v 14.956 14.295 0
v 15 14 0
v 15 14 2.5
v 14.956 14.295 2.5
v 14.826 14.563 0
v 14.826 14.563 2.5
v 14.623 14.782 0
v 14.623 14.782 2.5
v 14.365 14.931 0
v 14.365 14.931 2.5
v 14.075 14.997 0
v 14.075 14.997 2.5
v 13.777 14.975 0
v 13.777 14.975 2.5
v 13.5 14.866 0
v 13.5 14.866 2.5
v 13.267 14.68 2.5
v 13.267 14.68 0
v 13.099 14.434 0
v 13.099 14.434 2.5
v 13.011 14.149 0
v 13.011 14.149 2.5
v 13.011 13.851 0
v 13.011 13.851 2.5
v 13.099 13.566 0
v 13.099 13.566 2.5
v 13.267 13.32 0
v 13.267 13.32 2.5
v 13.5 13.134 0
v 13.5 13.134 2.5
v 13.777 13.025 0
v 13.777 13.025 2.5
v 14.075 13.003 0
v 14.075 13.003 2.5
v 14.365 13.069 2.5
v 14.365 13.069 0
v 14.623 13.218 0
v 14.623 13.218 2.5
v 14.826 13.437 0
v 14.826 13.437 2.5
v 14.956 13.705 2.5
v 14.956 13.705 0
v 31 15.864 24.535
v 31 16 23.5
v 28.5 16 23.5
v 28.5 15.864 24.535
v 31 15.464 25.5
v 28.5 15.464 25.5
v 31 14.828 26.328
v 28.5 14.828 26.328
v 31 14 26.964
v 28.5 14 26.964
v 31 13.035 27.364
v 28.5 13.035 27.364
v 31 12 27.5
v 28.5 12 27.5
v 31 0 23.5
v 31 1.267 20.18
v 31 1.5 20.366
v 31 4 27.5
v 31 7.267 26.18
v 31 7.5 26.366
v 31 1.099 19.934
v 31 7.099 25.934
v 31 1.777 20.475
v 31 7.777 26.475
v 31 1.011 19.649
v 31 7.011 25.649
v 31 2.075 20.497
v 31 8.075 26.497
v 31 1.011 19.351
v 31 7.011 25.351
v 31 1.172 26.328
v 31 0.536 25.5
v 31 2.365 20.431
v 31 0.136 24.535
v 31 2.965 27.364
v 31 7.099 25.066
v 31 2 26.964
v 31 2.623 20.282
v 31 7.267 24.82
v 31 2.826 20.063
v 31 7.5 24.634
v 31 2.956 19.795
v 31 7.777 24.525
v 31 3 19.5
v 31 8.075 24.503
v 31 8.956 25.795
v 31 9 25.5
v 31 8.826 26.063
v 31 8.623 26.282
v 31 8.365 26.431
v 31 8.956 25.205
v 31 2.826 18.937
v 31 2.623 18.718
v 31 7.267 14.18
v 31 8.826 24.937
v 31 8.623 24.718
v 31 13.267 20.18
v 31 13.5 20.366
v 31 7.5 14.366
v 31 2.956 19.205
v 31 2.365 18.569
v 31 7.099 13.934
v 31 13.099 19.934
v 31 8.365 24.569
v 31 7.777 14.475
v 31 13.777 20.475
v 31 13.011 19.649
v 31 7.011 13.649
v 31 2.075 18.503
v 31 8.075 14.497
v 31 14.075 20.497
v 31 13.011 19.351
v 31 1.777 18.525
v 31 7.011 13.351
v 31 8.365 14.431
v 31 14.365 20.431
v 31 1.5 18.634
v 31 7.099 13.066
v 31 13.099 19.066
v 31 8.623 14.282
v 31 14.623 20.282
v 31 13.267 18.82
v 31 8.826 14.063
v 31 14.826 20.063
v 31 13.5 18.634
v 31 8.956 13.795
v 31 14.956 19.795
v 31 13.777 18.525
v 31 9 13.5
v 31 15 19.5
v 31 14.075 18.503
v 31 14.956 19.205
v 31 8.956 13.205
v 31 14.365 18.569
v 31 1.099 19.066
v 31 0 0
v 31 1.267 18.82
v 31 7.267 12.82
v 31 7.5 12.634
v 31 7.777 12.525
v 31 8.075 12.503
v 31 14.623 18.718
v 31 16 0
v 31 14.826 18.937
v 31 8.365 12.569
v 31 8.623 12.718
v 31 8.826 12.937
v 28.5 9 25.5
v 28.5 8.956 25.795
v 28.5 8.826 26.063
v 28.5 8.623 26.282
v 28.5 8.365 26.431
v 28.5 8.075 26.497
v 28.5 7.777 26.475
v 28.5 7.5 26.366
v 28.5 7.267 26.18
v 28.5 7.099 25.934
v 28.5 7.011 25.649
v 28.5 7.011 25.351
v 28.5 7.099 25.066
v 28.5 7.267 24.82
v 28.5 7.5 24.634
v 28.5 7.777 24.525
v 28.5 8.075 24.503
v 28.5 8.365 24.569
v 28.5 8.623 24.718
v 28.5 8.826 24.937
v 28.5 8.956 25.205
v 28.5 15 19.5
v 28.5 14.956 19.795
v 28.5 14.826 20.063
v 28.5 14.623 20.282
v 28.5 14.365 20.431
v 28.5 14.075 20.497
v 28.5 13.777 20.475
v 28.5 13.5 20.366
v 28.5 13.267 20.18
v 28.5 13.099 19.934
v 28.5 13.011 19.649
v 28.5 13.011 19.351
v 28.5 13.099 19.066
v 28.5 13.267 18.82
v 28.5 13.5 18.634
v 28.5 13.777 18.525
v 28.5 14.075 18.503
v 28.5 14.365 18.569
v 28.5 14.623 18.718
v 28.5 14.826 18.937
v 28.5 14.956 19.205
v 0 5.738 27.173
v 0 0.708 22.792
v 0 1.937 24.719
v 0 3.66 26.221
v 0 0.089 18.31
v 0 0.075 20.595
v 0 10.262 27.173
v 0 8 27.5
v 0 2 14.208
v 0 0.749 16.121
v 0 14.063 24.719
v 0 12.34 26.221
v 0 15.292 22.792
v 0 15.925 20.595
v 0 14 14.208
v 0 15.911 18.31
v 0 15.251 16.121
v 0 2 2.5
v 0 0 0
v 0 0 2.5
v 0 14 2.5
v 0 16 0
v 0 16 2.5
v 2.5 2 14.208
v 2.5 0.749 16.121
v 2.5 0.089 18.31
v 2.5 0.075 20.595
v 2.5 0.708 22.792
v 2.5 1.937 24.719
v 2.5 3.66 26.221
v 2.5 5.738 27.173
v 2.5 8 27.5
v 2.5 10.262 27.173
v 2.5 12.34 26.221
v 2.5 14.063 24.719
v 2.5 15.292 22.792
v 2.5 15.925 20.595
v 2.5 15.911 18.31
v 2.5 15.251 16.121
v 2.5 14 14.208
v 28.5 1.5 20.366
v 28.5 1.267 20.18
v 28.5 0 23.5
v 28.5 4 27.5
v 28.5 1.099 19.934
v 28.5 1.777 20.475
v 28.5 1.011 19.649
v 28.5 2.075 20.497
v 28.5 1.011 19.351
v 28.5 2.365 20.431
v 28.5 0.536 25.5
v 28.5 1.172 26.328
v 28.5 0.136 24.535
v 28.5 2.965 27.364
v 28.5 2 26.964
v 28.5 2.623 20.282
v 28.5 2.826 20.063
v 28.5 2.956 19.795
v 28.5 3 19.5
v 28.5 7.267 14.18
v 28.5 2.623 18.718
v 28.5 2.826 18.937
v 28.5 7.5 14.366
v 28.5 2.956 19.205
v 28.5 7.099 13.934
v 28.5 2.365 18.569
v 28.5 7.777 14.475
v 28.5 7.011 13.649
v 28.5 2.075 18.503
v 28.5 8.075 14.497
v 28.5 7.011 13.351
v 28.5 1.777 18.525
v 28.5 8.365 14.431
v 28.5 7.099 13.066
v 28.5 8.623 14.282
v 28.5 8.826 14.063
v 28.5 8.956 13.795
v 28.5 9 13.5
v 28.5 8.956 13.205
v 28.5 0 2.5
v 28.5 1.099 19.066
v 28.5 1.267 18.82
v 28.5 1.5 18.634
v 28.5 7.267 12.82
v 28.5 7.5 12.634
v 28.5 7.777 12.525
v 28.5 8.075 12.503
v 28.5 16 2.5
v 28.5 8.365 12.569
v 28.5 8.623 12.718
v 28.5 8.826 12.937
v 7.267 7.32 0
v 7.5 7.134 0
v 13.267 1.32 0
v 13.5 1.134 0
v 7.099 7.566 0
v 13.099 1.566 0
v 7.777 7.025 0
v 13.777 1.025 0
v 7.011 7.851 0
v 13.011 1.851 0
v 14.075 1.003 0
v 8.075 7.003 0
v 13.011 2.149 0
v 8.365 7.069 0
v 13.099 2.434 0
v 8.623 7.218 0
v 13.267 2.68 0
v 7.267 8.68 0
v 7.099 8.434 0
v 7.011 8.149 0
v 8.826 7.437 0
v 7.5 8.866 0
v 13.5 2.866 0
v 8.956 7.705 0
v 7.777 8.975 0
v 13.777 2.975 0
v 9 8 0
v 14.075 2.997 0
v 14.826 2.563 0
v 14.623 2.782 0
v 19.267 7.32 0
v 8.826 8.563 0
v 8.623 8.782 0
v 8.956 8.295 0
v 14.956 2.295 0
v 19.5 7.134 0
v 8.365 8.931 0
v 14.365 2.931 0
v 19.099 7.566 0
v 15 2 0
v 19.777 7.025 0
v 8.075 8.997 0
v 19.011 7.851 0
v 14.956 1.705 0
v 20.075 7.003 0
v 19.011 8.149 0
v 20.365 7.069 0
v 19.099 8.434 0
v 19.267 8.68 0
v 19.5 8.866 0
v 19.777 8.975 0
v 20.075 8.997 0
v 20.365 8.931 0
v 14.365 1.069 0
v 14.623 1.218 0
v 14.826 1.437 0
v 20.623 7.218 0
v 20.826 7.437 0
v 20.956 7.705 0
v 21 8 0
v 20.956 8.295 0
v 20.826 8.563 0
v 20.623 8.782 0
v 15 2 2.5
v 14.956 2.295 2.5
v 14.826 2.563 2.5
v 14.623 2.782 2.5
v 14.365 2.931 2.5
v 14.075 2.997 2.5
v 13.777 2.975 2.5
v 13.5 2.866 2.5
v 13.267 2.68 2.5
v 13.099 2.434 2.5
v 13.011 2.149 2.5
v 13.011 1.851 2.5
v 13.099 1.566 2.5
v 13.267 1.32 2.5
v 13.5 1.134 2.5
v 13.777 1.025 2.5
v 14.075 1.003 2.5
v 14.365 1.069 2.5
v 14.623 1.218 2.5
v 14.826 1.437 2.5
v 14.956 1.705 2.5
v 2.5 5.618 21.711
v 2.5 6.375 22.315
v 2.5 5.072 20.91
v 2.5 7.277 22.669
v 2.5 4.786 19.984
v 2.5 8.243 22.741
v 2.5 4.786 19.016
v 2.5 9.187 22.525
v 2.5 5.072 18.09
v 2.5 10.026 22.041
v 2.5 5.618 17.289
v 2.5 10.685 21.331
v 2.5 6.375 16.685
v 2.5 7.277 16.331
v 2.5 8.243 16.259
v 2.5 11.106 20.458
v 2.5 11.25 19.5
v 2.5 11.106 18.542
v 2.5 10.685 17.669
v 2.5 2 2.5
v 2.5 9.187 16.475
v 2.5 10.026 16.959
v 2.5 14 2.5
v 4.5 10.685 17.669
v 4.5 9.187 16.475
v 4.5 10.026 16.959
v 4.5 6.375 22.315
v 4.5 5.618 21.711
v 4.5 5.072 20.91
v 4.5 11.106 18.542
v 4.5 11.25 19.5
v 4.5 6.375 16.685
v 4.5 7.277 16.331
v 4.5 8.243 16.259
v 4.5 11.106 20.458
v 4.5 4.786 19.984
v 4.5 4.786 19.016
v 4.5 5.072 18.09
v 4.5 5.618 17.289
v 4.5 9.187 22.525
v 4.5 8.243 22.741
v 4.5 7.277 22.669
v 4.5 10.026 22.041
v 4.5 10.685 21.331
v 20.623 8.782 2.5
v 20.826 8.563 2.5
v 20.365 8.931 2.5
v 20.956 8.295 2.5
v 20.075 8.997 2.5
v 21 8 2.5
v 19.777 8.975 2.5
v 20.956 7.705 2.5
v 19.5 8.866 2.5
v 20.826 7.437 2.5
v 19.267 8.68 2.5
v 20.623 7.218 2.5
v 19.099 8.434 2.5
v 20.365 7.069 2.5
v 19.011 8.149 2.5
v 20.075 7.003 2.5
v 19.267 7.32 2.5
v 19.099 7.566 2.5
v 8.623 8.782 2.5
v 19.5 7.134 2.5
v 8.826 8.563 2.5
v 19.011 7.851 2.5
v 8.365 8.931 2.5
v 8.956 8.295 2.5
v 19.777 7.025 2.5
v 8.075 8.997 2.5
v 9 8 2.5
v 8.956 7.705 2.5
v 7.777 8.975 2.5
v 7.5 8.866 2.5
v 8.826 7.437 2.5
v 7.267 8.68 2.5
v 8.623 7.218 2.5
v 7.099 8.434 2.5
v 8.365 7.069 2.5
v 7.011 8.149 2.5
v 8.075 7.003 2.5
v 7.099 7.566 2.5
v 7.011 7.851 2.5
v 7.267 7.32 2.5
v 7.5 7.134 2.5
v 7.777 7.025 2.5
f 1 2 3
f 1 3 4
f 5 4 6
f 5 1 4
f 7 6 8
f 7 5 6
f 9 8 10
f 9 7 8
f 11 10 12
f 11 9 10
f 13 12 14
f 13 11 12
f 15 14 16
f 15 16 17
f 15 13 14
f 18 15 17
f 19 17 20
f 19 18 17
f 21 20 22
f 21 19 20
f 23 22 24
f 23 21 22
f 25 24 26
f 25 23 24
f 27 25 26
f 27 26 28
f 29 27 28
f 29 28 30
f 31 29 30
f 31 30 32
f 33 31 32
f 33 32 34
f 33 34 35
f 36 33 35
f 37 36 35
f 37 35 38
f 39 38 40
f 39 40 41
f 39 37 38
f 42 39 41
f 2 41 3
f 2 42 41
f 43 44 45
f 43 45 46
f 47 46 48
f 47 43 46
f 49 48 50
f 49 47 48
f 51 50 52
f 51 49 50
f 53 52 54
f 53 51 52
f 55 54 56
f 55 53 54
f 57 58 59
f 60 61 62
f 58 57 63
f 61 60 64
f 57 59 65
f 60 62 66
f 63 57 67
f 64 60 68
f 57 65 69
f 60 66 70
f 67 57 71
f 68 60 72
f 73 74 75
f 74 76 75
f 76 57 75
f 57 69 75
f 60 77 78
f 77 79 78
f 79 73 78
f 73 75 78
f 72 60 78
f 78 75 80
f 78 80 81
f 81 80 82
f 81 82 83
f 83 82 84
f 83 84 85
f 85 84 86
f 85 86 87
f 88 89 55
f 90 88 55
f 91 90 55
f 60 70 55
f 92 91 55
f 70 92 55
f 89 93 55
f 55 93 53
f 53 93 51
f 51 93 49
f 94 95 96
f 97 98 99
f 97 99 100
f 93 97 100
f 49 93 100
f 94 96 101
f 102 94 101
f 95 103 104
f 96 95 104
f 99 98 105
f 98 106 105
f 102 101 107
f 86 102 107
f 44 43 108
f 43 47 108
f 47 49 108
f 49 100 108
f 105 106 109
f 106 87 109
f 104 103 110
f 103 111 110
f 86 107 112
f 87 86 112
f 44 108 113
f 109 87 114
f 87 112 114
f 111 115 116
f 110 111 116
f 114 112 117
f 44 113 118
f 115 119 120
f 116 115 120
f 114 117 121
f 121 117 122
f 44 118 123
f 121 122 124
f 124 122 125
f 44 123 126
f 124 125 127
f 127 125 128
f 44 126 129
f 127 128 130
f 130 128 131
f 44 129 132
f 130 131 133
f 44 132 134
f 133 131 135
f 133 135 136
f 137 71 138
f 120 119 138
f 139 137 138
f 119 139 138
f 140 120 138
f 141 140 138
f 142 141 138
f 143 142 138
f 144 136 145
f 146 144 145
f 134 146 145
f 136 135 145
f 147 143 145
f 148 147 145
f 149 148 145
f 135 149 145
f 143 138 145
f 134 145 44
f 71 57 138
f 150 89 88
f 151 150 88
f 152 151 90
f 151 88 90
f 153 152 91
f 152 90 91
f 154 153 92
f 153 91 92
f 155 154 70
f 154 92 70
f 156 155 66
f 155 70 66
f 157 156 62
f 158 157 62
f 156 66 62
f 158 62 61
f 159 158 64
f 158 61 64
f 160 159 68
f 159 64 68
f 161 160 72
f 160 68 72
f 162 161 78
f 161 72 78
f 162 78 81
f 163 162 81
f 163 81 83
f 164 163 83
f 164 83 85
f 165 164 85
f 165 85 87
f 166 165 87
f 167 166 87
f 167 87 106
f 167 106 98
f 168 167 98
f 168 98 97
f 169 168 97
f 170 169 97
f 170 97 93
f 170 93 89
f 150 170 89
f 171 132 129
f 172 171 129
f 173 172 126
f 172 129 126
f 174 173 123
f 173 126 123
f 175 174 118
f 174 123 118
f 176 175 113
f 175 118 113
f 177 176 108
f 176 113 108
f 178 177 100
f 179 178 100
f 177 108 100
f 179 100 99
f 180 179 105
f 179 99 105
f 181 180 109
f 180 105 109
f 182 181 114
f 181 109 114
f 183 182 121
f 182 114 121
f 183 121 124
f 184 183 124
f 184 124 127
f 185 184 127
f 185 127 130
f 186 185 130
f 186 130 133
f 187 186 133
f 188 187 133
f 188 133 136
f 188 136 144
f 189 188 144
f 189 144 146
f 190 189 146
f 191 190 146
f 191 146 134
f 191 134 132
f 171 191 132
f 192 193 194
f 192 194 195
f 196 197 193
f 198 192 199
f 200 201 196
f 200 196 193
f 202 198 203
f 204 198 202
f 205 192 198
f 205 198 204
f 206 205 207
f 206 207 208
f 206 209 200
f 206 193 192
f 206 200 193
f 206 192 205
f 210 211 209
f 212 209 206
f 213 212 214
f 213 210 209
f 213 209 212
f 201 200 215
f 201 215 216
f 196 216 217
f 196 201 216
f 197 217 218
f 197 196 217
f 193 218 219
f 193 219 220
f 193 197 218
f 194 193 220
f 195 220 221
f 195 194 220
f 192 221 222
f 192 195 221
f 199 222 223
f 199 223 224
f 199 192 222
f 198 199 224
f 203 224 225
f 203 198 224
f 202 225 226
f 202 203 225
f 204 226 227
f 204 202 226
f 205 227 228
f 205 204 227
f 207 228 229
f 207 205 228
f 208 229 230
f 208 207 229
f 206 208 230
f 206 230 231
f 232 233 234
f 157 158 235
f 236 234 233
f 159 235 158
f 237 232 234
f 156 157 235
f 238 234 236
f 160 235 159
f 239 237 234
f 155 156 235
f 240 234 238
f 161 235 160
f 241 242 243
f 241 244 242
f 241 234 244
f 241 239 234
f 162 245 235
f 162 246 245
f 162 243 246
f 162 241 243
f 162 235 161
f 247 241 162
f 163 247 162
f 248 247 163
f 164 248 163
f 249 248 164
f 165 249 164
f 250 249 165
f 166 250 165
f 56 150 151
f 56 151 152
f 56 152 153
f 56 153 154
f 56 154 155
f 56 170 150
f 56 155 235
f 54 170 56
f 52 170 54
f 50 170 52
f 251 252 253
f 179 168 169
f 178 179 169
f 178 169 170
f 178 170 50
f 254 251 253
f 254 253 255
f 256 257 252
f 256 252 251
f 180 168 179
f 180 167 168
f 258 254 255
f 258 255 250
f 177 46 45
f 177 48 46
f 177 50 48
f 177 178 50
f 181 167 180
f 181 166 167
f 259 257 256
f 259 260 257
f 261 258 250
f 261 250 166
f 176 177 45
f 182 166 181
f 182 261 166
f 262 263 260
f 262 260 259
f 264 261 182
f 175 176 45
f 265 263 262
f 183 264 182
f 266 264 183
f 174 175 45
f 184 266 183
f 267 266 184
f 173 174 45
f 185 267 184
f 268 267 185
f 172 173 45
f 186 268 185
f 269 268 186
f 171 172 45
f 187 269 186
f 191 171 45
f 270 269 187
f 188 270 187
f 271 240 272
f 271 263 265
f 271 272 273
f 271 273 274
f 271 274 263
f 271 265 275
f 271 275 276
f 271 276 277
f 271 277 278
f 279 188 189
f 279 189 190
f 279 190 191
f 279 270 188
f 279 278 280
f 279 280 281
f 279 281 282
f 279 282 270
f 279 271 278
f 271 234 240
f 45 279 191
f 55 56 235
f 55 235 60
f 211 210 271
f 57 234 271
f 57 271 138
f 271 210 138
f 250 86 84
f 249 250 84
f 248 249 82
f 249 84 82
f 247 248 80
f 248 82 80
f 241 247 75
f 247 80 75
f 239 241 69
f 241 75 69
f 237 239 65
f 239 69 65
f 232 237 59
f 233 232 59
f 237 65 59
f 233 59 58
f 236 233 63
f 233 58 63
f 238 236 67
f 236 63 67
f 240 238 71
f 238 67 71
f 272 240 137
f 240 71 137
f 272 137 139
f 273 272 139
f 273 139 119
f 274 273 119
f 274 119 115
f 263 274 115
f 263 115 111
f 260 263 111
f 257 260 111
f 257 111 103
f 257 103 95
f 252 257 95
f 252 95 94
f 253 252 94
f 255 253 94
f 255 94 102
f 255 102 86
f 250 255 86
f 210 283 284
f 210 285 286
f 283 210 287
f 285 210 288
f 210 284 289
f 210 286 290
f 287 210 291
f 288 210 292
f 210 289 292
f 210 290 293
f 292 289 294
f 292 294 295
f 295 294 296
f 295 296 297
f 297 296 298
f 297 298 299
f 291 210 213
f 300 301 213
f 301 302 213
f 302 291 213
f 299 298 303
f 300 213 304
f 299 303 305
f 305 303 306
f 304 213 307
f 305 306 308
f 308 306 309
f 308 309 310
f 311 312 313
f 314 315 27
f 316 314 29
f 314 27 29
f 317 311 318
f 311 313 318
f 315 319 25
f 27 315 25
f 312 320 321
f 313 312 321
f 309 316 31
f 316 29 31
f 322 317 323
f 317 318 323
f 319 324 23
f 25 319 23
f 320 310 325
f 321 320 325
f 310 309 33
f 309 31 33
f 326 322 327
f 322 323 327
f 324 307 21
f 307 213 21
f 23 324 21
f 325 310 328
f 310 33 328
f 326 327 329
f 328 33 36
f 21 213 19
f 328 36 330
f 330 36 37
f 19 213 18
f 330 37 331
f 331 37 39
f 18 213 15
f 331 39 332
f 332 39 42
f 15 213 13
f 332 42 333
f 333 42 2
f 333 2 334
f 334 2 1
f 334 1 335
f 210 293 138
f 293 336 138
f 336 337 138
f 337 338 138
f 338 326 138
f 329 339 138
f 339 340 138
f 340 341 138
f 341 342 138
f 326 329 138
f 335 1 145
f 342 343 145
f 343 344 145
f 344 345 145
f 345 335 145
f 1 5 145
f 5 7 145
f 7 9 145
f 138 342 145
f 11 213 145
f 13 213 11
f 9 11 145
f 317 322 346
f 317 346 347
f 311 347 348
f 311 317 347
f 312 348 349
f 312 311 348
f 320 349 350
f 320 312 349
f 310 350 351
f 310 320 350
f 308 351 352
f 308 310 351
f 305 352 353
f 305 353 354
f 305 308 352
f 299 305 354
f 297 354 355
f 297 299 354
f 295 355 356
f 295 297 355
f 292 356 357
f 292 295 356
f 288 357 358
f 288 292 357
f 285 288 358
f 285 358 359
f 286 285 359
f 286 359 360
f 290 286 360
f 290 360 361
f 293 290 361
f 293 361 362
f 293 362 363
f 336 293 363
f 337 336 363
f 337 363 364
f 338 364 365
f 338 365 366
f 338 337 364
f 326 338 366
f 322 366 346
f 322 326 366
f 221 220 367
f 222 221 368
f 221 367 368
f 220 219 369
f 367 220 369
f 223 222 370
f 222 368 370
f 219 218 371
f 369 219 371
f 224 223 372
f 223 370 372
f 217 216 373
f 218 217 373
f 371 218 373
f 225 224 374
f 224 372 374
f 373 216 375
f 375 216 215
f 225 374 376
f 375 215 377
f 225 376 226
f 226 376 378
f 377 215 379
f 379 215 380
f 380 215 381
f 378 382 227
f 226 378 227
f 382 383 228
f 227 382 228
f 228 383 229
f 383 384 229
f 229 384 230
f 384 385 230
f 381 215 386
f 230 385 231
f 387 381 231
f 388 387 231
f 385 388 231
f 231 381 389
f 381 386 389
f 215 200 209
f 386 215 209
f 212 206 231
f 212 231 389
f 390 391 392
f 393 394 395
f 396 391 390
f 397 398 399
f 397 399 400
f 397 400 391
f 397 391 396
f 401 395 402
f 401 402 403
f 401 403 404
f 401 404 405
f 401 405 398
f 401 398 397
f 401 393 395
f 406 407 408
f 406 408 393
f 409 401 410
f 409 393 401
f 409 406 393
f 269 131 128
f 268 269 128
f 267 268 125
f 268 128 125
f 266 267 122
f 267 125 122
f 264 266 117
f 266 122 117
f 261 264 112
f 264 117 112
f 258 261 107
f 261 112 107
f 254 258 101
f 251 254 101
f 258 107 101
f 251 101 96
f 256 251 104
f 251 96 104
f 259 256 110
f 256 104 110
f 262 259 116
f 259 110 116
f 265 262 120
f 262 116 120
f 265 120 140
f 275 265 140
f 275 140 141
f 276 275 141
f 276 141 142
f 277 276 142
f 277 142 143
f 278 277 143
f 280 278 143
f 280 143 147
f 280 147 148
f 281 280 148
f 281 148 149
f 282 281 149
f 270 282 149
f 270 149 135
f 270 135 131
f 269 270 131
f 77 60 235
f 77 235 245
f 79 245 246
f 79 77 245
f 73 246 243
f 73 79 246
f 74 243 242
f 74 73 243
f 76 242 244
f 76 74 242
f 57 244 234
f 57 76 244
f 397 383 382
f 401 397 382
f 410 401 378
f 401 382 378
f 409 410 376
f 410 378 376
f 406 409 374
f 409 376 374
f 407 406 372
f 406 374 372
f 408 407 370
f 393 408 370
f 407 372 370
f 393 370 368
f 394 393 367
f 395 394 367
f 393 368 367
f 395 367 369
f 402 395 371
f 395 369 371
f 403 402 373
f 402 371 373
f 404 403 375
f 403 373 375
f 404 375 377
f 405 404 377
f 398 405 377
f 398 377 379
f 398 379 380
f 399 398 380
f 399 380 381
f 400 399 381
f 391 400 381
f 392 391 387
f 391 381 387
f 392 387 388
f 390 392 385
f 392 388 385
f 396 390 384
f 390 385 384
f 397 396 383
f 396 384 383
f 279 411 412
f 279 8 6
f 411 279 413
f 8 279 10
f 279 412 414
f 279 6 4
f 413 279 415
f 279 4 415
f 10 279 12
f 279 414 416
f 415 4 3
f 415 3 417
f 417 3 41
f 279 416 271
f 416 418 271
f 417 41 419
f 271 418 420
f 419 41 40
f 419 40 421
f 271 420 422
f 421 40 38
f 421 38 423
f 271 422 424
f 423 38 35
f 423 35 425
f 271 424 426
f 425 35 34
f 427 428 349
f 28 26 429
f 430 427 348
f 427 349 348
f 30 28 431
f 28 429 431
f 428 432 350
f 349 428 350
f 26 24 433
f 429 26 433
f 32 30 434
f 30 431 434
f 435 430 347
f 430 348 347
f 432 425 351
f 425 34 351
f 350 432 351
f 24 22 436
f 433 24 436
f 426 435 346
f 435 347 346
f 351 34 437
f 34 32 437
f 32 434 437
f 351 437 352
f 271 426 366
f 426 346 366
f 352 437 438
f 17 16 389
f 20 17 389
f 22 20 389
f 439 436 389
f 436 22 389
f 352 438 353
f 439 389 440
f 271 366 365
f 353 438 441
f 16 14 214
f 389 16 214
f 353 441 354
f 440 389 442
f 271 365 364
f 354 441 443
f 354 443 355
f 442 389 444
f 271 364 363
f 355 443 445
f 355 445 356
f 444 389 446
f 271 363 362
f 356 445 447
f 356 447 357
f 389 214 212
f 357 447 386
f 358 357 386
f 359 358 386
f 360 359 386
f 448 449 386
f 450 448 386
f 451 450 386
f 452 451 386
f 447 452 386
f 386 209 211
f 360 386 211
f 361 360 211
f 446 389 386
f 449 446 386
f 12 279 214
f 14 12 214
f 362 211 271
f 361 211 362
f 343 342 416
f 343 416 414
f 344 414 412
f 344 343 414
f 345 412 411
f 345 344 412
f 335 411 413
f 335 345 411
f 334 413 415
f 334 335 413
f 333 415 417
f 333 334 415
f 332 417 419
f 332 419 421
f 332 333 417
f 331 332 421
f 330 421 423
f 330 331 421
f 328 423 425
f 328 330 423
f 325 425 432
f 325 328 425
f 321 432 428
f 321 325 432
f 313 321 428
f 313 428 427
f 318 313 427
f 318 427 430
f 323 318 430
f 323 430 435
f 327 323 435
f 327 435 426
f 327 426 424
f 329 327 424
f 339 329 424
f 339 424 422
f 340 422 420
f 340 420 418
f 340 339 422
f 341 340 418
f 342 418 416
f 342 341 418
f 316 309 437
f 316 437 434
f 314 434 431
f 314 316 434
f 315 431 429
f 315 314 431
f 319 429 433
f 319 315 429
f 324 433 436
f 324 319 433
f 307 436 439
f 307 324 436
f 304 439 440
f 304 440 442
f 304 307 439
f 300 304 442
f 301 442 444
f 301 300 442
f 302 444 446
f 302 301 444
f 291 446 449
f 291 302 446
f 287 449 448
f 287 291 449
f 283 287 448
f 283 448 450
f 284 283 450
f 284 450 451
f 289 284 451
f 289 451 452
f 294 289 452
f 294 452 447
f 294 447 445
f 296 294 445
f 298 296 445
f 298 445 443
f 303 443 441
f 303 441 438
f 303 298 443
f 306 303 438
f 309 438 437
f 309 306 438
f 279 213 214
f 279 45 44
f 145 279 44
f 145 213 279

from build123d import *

# Parameters (mm, degrees)
SKETCH_W        = 31
SKETCH_H        = 16
SKETCH_R        = 1
PAD_DEPTH       = 2.5
SKETCH001_W     = 2.5
SKETCH001_H     = 16
PAD001_DEPTH    = 25
SKETCH002_R     = 1
POCKET_DEPTH    = 5
SKETCH003_W     = 2.5
SKETCH003_H     = 16
PAD002_DEPTH    = 25
POCKET001_DEPTH = 5
SKETCH005_R     = 3.25
PAD003_DEPTH    = 2


with BuildPart() as part:
    # Sketch → Pad (new body)
    with BuildSketch(Plane.XY):
        with Locations((15.5, 8)):
            Rectangle(SKETCH_W, SKETCH_H)
        with Locations((14, 14)):
            Circle(SKETCH_R, mode=Mode.SUBTRACT)
        with Locations((8, 8)):
            Circle(SKETCH_R, mode=Mode.SUBTRACT)
        with Locations((14, 2)):
            Circle(SKETCH_R, mode=Mode.SUBTRACT)
        with Locations((20, 8)):
            Circle(SKETCH_R, mode=Mode.SUBTRACT)
    extrude(amount=PAD_DEPTH)

    # Sketch001 (on Face10 of Pad) → Pad001 (join)
    with BuildSketch(Plane.XY.offset(2.5)):
        with Locations((29.75, 8)):
            Rectangle(SKETCH001_W, SKETCH001_H)
    extrude(amount=PAD001_DEPTH)

    # Sketch002 (on Face8 of Pad001) → Pocket (cut)
    with BuildSketch(Plane.YZ.offset(31)):
        with Locations((8, 25.5)):
            Circle(SKETCH002_R)
        with Locations((2, 19.5)):
            Circle(SKETCH002_R)
        with Locations((14, 19.5)):
            Circle(SKETCH002_R)
        with Locations((8, 13.5)):
            Circle(SKETCH002_R)
        with BuildLine():
            ThreePointArc((4, 27.5), (1.171573, 26.328427), (0, 23.5))
            Line((0, 23.5), (-2, 23.5))
            Line((-2, 23.5), (-2, 29.5))
            Line((-2, 29.5), (4, 29.5))
            Line((4, 29.5), (4, 27.5))
        make_face()
        with BuildLine():
            ThreePointArc((16, 23.5), (14.828427, 26.328427), (12, 27.5))
            Line((12, 29.5), (12, 27.5))
            Line((18, 29.5), (12, 29.5))
            Line((18, 23.5), (18, 29.5))
            Line((16, 23.5), (18, 23.5))
        make_face()
    extrude(amount=-POCKET_DEPTH, mode=Mode.SUBTRACT)

    # Sketch003 (on Face5 of Pocket) → Pad002 (join)
    with BuildSketch(Plane.XY.offset(2.5)):
        with Locations((1.25, 8)):
            Rectangle(SKETCH003_W, SKETCH003_H)
    extrude(amount=PAD002_DEPTH)

    # Sketch004 (on Face9 of Pad002) → Pocket001 (cut)
    with BuildSketch(Plane(origin=(0, 0, 0), x_dir=(0, -1, 0), z_dir=(-1, 0, 0))):
        with BuildLine():
            ThreePointArc((-2, 14.208497), (-8, 27.5), (-14, 14.208497))
            Line((-14, 14.208497), (-14, 2.5))
            Line((-14, 2.5), (-18, 2.5))
            Line((-18, 2.5), (-18, 29.5))
            Line((-18, 29.5), (2, 29.5))
            Line((2, 29.5), (2, 2.5))
            Line((-2, 2.5), (2, 2.5))
            Line((-2, 14.208497), (-2, 2.5))
        make_face()
    extrude(amount=-POCKET001_DEPTH, mode=Mode.SUBTRACT)

    # Sketch005 (on Face19 of Pocket001) → Pad003 (join)
    with BuildSketch(Plane.YZ.offset(2.5)):
        with Locations((8, 19.5)):
            Circle(SKETCH005_R)
    extrude(amount=PAD003_DEPTH)


solid = part.part
